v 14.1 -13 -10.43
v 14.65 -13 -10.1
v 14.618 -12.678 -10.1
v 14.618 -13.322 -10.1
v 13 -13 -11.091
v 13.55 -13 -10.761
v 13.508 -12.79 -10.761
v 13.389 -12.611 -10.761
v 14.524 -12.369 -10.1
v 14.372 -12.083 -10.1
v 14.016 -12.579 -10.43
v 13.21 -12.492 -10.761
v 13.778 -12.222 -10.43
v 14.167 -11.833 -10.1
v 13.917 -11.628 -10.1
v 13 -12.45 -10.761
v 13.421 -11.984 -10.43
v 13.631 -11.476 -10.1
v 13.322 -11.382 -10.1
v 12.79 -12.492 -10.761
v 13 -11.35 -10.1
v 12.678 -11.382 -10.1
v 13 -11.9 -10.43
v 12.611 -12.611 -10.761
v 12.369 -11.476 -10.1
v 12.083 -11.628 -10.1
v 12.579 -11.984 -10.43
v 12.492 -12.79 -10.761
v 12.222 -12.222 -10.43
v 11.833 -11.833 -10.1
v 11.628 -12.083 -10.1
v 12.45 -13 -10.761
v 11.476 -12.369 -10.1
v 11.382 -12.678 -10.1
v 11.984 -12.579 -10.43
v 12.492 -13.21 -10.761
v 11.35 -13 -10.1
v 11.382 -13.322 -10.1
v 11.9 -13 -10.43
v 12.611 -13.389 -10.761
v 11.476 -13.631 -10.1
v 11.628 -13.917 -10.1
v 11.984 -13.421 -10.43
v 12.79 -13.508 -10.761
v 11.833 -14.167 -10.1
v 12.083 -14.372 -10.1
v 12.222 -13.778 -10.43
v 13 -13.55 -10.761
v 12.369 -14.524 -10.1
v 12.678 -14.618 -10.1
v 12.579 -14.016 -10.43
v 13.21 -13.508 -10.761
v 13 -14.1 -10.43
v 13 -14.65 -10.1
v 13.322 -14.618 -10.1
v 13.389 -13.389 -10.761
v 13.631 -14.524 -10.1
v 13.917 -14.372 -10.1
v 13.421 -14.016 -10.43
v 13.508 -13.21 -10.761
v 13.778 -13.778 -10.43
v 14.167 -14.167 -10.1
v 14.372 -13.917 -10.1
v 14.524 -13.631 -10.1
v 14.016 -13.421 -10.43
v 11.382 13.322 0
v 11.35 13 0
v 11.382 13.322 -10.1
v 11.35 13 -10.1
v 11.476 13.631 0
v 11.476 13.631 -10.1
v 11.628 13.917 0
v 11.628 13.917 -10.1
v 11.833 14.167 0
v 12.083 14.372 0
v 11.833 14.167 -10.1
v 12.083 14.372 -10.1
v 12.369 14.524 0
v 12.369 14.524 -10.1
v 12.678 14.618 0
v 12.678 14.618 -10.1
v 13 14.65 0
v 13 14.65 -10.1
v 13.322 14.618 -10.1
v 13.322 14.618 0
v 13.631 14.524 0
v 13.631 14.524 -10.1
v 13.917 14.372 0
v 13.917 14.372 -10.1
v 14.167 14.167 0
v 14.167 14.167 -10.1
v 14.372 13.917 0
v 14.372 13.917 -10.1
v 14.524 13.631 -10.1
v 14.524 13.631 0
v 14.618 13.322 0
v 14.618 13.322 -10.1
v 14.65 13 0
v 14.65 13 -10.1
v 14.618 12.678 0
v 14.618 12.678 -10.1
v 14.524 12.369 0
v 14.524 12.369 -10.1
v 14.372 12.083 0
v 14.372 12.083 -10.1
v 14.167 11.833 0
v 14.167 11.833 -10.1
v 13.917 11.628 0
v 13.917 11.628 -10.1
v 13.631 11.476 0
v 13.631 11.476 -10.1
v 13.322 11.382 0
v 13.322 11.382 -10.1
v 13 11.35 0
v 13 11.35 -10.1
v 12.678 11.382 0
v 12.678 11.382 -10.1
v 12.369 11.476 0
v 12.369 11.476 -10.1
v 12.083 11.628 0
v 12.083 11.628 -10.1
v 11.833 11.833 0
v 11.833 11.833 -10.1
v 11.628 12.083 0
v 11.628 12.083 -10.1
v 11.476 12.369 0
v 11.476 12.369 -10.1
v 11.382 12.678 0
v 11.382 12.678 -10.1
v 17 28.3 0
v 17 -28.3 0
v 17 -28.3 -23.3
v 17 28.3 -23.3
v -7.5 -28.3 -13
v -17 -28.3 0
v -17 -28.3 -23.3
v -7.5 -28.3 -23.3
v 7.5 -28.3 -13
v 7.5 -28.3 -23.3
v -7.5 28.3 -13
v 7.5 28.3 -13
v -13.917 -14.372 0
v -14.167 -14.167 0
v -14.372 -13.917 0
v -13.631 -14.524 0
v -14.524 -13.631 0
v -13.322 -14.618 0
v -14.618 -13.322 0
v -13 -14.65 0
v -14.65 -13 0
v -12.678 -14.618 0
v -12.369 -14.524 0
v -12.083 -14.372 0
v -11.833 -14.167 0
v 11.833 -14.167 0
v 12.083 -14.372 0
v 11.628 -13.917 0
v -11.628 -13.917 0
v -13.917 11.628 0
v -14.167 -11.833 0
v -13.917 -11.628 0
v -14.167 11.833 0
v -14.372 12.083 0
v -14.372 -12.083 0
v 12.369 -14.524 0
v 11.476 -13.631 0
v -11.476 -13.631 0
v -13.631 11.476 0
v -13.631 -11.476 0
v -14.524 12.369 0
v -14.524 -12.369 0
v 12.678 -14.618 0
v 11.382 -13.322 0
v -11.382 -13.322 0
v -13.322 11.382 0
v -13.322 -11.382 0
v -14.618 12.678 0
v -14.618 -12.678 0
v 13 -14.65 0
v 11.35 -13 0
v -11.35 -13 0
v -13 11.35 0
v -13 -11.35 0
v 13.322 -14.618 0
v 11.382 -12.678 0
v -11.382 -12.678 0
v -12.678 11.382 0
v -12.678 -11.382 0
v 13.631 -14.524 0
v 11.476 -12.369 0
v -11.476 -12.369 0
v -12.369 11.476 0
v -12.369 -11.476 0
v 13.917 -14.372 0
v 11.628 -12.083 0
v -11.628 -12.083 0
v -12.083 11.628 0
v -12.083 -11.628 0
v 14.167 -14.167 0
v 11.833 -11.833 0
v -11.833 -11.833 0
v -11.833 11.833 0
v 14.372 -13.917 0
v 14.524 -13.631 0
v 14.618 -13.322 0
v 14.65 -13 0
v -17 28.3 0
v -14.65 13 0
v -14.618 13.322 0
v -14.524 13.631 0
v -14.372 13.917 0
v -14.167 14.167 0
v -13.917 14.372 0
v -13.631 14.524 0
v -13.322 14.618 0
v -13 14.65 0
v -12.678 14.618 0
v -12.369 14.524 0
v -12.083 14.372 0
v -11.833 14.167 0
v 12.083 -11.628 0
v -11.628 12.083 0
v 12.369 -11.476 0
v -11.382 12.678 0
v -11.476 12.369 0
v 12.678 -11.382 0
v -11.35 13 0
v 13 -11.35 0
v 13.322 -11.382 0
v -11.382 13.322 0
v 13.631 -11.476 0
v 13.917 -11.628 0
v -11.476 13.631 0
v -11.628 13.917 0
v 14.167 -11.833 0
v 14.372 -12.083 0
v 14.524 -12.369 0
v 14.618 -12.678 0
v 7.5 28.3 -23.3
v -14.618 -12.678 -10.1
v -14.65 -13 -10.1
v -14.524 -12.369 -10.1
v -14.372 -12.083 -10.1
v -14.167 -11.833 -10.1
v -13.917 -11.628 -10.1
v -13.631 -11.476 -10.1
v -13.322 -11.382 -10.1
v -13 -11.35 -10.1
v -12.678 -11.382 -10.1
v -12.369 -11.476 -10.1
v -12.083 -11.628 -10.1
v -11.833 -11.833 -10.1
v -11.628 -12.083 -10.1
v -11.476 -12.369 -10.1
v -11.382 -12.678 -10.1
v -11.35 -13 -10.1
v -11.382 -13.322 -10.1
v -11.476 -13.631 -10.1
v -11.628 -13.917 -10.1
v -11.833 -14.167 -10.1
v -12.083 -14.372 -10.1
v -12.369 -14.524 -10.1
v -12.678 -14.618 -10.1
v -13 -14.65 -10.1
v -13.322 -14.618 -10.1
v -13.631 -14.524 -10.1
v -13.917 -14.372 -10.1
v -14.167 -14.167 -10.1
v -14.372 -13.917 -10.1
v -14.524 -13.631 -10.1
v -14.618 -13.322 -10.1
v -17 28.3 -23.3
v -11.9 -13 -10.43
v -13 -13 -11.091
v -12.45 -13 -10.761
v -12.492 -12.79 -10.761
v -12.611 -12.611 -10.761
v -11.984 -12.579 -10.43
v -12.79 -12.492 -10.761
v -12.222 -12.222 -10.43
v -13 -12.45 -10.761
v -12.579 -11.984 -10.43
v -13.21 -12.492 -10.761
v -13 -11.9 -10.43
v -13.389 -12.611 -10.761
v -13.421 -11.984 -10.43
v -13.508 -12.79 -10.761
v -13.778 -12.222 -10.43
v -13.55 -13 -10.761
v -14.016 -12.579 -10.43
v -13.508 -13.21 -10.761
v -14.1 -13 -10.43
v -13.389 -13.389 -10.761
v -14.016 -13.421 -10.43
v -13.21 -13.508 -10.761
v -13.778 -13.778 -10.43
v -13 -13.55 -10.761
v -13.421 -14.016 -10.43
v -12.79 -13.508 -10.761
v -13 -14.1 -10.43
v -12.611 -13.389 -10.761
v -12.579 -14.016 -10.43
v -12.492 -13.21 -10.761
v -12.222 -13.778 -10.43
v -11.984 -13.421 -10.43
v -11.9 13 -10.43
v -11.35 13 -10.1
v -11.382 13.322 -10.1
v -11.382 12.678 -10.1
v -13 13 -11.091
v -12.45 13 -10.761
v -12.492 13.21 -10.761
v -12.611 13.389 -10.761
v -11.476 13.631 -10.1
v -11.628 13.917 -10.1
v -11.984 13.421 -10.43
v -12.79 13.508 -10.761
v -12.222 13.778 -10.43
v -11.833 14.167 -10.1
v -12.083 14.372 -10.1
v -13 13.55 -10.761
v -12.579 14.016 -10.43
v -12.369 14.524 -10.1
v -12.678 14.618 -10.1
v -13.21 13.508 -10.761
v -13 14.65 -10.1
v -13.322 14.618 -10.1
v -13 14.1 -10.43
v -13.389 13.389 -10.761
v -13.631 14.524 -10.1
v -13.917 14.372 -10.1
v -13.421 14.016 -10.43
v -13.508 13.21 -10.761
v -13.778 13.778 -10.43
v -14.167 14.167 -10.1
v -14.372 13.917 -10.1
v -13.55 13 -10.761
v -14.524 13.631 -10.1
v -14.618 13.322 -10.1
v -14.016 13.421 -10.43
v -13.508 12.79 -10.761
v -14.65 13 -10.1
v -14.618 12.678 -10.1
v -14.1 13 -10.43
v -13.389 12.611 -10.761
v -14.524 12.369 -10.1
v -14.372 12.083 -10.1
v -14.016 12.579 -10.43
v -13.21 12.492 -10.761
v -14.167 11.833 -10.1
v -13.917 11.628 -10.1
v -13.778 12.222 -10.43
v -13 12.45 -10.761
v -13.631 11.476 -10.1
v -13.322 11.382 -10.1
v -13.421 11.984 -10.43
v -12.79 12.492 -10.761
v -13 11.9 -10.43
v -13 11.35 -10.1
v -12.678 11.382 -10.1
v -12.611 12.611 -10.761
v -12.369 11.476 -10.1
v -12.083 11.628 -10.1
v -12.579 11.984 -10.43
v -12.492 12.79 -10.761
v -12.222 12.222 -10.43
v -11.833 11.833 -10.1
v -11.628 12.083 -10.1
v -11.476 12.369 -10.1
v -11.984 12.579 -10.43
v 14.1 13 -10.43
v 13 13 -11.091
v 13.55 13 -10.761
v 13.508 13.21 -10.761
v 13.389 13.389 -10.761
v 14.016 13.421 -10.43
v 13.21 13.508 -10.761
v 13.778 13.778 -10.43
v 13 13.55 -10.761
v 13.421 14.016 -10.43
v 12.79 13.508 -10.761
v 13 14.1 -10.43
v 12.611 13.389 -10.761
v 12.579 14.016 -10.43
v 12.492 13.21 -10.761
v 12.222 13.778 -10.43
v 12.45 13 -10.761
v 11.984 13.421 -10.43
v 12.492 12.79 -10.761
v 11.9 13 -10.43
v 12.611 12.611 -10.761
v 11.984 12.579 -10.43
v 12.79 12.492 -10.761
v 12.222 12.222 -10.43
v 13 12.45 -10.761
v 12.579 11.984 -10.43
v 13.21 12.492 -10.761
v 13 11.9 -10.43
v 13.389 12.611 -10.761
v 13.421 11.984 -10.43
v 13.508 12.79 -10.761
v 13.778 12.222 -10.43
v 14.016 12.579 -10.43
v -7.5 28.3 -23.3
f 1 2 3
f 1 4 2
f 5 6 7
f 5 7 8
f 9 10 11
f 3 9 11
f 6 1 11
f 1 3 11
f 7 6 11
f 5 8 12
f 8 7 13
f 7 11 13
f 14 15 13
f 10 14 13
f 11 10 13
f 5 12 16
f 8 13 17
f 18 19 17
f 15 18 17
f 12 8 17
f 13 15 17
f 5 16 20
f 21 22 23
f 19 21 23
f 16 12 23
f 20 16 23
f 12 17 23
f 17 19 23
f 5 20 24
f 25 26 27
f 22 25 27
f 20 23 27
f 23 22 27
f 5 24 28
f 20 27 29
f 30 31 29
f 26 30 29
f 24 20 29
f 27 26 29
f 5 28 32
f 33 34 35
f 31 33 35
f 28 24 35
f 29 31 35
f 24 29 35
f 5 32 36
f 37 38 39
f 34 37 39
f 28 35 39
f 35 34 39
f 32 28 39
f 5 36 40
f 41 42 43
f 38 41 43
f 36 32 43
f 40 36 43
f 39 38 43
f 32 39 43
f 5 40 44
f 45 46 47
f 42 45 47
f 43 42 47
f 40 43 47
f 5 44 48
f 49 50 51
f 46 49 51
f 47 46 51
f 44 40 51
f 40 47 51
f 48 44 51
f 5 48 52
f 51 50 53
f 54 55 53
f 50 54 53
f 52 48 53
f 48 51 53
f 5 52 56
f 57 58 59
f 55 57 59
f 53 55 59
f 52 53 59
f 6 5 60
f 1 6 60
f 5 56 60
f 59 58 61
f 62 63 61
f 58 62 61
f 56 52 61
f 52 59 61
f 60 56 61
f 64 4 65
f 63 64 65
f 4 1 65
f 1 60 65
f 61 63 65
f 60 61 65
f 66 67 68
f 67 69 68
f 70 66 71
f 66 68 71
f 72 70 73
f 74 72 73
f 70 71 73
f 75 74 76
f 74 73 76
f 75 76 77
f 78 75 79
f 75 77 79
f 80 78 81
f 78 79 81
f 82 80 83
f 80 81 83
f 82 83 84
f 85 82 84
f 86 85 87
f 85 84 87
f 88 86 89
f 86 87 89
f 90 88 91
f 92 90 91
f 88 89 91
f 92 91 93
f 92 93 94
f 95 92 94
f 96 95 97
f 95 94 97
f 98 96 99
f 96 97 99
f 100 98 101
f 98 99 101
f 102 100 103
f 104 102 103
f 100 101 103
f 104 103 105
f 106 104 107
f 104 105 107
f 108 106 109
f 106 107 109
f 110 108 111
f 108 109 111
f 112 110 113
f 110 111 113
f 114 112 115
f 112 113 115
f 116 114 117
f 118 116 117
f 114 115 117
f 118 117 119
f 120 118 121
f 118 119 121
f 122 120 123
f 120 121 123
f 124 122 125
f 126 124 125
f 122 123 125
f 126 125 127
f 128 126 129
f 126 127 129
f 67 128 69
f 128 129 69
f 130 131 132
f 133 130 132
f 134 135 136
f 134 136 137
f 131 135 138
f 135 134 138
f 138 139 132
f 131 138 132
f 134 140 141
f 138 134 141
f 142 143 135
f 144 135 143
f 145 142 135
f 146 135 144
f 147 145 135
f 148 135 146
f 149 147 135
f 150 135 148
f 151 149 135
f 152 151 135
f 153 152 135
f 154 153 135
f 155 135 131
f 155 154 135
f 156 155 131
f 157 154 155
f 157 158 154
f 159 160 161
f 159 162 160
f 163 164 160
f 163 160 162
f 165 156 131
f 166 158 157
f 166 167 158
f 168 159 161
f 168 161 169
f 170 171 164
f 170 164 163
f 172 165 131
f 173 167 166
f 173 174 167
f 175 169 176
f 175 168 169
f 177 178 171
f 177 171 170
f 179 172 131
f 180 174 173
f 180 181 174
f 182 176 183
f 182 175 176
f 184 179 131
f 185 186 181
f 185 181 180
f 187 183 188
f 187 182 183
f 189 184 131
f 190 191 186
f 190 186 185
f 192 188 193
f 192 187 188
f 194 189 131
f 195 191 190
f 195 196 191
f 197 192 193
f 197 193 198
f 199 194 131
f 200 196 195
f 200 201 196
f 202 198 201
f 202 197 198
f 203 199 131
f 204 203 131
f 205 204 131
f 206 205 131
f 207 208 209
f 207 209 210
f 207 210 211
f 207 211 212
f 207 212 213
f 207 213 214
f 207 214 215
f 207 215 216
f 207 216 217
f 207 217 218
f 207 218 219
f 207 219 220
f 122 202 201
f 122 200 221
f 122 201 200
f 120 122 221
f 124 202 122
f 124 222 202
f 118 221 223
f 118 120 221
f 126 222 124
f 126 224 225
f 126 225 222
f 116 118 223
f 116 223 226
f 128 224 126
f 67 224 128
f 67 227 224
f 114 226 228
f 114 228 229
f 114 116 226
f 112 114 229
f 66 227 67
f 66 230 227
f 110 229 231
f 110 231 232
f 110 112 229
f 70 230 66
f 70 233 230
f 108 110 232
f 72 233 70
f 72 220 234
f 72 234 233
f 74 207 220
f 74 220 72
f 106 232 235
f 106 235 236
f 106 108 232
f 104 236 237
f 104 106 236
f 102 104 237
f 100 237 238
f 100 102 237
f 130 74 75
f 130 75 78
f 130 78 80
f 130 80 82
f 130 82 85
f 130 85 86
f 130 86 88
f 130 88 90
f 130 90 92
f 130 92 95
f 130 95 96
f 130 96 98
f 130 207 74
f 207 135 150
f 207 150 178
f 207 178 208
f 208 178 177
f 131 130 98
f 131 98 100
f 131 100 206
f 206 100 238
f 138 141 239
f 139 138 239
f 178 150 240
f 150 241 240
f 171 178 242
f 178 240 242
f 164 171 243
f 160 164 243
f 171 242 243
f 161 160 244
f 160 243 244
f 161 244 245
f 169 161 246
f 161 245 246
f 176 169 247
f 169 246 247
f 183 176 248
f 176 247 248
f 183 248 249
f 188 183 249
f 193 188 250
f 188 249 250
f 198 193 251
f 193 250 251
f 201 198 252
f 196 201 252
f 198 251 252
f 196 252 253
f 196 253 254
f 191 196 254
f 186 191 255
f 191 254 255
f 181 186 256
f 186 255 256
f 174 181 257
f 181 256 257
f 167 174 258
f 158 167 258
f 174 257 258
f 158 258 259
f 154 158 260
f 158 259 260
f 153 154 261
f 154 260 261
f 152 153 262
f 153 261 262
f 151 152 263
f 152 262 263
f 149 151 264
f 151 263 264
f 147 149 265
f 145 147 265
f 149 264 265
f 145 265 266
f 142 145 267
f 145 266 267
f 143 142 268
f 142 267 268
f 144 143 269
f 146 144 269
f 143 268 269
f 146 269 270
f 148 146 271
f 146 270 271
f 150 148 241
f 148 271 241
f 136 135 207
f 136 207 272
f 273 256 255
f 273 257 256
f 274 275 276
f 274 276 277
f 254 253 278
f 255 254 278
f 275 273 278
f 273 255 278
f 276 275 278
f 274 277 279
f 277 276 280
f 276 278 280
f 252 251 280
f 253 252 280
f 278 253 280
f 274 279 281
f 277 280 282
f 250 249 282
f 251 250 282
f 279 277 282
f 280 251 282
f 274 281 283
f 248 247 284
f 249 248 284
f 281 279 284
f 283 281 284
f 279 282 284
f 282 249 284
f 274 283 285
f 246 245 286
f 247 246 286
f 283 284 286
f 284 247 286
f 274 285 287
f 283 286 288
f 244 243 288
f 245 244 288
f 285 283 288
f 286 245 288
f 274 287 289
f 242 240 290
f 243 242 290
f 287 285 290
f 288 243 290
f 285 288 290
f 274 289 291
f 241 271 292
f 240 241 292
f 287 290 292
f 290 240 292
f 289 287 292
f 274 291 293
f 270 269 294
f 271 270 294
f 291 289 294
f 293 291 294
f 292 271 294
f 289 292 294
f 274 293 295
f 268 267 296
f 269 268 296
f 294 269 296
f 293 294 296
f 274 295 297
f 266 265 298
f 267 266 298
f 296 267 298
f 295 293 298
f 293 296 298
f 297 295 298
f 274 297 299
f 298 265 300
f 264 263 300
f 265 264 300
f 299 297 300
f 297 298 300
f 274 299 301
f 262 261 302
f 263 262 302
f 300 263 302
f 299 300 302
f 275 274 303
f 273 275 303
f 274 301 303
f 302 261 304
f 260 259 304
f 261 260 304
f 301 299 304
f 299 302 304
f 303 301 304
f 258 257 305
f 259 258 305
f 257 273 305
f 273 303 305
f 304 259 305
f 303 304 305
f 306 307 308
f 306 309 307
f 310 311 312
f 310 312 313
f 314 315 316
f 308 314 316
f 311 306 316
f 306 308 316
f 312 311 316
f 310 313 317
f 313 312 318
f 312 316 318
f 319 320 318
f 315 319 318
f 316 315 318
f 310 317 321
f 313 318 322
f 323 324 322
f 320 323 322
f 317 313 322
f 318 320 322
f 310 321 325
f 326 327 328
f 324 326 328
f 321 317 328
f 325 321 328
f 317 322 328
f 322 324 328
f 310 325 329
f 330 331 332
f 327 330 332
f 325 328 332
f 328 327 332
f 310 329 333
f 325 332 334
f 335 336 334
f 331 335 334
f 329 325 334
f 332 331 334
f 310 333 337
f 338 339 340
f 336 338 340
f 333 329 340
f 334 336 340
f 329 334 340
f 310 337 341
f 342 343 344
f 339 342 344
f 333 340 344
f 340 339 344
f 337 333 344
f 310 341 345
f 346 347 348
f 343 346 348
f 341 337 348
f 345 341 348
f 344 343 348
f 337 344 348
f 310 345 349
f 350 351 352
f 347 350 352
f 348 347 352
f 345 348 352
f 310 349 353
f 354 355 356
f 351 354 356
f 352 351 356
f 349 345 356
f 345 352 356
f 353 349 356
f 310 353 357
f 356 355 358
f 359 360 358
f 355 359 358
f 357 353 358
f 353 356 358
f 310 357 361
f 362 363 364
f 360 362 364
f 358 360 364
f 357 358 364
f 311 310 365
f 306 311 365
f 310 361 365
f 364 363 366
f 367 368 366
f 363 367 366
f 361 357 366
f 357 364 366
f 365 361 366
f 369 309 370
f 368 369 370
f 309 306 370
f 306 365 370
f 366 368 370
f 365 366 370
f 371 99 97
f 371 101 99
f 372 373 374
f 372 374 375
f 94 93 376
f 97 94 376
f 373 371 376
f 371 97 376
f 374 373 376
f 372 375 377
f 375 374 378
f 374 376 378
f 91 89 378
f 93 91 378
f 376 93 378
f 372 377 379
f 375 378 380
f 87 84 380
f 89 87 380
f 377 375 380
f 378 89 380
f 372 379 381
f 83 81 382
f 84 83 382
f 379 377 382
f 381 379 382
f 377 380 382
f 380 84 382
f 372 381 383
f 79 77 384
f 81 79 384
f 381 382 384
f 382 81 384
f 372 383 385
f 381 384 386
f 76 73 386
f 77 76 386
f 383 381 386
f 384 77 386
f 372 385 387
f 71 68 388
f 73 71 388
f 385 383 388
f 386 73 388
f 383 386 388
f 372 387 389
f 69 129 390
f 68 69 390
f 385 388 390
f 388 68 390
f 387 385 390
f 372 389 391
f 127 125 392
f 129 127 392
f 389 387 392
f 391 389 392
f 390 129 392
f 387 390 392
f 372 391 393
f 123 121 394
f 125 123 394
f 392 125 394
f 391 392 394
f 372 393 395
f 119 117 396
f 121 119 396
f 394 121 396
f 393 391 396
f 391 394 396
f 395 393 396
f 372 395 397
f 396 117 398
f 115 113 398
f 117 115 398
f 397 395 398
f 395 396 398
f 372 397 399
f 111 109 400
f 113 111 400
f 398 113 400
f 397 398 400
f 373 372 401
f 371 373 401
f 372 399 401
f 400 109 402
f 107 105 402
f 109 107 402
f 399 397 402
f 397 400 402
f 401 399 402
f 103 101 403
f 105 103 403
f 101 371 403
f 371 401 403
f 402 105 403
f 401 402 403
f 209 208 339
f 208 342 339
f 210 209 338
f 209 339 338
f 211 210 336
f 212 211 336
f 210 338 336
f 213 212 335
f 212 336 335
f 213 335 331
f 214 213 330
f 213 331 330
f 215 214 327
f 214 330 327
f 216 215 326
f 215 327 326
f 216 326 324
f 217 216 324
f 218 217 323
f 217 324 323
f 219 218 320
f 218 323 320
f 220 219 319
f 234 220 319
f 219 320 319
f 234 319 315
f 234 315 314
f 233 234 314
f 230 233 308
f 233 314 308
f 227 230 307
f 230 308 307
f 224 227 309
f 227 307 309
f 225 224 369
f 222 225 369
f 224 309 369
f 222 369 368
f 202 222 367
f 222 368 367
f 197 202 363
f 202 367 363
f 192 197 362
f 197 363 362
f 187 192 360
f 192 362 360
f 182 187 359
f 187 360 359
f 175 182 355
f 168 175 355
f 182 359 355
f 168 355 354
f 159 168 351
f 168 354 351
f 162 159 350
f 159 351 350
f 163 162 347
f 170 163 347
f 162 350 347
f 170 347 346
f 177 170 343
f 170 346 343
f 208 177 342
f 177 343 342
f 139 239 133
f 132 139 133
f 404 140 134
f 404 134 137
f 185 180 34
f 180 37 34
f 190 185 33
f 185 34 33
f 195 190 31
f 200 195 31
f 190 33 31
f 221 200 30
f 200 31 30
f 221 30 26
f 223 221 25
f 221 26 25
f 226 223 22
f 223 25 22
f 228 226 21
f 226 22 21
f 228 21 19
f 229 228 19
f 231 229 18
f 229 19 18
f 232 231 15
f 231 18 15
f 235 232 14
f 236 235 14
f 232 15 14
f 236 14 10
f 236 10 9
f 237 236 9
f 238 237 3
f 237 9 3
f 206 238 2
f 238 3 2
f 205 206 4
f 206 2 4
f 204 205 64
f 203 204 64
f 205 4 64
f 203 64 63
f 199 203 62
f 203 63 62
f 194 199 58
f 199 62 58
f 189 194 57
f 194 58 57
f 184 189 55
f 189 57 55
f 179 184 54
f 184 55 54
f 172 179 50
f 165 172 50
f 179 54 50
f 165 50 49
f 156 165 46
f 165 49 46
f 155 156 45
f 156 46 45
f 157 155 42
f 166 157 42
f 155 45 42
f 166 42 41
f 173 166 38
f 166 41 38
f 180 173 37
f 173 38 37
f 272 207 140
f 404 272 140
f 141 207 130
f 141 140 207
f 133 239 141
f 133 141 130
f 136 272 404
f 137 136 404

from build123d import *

# Parameters (mm, degrees)
SKETCH_1_W          = 34
SKETCH_1_H          = 23.3
EXTRUDE_1_DEPTH     = 28.3
SKETCH_2_W          = 15
SKETCH_2_H          = 10.3
CUT_EXTRUDE_1_DEPTH = 64.525191853
M4X0_7_1_D          = 3.3
M4X0_7_1_DEPTH      = 10.1
M4X0_7_1_TIP        = 0.991420021


with BuildPart() as part:
    # 草图1 → 凸台-拉伸1 (new, symmetric)
    with BuildSketch(Plane(origin=(0, 0, 0), x_dir=(1, 0, 0), z_dir=(0, 1, 0))):
        with Locations((0, 11.65)):
            Rectangle(SKETCH_1_W, SKETCH_1_H)
    extrude(amount=EXTRUDE_1_DEPTH, both=True)

    # 草图2 → 切除-拉伸1 (cut, through all)
    with BuildSketch(Plane(origin=(0, 28.3, 0), x_dir=(1, 0, 0), z_dir=(0, 1, 0))):
        with Locations((0, 18.15)):
            Rectangle(SKETCH_2_W, SKETCH_2_H)
    extrude(amount=-CUT_EXTRUDE_1_DEPTH, mode=Mode.SUBTRACT)

    # M4x0.7 螺纹孔1
    with Locations(Plane.XY):
        with Locations((-13, 13), (-13, -13), (13, -13), (13, 13)):
            Hole(M4X0_7_1_D / 2, depth=M4X0_7_1_DEPTH)
            with Locations((0, 0, -(M4X0_7_1_DEPTH + M4X0_7_1_TIP / 2))):  # 118° drill point
                Cone(0, M4X0_7_1_D / 2, M4X0_7_1_TIP, mode=Mode.SUBTRACT)


solid = part.part
